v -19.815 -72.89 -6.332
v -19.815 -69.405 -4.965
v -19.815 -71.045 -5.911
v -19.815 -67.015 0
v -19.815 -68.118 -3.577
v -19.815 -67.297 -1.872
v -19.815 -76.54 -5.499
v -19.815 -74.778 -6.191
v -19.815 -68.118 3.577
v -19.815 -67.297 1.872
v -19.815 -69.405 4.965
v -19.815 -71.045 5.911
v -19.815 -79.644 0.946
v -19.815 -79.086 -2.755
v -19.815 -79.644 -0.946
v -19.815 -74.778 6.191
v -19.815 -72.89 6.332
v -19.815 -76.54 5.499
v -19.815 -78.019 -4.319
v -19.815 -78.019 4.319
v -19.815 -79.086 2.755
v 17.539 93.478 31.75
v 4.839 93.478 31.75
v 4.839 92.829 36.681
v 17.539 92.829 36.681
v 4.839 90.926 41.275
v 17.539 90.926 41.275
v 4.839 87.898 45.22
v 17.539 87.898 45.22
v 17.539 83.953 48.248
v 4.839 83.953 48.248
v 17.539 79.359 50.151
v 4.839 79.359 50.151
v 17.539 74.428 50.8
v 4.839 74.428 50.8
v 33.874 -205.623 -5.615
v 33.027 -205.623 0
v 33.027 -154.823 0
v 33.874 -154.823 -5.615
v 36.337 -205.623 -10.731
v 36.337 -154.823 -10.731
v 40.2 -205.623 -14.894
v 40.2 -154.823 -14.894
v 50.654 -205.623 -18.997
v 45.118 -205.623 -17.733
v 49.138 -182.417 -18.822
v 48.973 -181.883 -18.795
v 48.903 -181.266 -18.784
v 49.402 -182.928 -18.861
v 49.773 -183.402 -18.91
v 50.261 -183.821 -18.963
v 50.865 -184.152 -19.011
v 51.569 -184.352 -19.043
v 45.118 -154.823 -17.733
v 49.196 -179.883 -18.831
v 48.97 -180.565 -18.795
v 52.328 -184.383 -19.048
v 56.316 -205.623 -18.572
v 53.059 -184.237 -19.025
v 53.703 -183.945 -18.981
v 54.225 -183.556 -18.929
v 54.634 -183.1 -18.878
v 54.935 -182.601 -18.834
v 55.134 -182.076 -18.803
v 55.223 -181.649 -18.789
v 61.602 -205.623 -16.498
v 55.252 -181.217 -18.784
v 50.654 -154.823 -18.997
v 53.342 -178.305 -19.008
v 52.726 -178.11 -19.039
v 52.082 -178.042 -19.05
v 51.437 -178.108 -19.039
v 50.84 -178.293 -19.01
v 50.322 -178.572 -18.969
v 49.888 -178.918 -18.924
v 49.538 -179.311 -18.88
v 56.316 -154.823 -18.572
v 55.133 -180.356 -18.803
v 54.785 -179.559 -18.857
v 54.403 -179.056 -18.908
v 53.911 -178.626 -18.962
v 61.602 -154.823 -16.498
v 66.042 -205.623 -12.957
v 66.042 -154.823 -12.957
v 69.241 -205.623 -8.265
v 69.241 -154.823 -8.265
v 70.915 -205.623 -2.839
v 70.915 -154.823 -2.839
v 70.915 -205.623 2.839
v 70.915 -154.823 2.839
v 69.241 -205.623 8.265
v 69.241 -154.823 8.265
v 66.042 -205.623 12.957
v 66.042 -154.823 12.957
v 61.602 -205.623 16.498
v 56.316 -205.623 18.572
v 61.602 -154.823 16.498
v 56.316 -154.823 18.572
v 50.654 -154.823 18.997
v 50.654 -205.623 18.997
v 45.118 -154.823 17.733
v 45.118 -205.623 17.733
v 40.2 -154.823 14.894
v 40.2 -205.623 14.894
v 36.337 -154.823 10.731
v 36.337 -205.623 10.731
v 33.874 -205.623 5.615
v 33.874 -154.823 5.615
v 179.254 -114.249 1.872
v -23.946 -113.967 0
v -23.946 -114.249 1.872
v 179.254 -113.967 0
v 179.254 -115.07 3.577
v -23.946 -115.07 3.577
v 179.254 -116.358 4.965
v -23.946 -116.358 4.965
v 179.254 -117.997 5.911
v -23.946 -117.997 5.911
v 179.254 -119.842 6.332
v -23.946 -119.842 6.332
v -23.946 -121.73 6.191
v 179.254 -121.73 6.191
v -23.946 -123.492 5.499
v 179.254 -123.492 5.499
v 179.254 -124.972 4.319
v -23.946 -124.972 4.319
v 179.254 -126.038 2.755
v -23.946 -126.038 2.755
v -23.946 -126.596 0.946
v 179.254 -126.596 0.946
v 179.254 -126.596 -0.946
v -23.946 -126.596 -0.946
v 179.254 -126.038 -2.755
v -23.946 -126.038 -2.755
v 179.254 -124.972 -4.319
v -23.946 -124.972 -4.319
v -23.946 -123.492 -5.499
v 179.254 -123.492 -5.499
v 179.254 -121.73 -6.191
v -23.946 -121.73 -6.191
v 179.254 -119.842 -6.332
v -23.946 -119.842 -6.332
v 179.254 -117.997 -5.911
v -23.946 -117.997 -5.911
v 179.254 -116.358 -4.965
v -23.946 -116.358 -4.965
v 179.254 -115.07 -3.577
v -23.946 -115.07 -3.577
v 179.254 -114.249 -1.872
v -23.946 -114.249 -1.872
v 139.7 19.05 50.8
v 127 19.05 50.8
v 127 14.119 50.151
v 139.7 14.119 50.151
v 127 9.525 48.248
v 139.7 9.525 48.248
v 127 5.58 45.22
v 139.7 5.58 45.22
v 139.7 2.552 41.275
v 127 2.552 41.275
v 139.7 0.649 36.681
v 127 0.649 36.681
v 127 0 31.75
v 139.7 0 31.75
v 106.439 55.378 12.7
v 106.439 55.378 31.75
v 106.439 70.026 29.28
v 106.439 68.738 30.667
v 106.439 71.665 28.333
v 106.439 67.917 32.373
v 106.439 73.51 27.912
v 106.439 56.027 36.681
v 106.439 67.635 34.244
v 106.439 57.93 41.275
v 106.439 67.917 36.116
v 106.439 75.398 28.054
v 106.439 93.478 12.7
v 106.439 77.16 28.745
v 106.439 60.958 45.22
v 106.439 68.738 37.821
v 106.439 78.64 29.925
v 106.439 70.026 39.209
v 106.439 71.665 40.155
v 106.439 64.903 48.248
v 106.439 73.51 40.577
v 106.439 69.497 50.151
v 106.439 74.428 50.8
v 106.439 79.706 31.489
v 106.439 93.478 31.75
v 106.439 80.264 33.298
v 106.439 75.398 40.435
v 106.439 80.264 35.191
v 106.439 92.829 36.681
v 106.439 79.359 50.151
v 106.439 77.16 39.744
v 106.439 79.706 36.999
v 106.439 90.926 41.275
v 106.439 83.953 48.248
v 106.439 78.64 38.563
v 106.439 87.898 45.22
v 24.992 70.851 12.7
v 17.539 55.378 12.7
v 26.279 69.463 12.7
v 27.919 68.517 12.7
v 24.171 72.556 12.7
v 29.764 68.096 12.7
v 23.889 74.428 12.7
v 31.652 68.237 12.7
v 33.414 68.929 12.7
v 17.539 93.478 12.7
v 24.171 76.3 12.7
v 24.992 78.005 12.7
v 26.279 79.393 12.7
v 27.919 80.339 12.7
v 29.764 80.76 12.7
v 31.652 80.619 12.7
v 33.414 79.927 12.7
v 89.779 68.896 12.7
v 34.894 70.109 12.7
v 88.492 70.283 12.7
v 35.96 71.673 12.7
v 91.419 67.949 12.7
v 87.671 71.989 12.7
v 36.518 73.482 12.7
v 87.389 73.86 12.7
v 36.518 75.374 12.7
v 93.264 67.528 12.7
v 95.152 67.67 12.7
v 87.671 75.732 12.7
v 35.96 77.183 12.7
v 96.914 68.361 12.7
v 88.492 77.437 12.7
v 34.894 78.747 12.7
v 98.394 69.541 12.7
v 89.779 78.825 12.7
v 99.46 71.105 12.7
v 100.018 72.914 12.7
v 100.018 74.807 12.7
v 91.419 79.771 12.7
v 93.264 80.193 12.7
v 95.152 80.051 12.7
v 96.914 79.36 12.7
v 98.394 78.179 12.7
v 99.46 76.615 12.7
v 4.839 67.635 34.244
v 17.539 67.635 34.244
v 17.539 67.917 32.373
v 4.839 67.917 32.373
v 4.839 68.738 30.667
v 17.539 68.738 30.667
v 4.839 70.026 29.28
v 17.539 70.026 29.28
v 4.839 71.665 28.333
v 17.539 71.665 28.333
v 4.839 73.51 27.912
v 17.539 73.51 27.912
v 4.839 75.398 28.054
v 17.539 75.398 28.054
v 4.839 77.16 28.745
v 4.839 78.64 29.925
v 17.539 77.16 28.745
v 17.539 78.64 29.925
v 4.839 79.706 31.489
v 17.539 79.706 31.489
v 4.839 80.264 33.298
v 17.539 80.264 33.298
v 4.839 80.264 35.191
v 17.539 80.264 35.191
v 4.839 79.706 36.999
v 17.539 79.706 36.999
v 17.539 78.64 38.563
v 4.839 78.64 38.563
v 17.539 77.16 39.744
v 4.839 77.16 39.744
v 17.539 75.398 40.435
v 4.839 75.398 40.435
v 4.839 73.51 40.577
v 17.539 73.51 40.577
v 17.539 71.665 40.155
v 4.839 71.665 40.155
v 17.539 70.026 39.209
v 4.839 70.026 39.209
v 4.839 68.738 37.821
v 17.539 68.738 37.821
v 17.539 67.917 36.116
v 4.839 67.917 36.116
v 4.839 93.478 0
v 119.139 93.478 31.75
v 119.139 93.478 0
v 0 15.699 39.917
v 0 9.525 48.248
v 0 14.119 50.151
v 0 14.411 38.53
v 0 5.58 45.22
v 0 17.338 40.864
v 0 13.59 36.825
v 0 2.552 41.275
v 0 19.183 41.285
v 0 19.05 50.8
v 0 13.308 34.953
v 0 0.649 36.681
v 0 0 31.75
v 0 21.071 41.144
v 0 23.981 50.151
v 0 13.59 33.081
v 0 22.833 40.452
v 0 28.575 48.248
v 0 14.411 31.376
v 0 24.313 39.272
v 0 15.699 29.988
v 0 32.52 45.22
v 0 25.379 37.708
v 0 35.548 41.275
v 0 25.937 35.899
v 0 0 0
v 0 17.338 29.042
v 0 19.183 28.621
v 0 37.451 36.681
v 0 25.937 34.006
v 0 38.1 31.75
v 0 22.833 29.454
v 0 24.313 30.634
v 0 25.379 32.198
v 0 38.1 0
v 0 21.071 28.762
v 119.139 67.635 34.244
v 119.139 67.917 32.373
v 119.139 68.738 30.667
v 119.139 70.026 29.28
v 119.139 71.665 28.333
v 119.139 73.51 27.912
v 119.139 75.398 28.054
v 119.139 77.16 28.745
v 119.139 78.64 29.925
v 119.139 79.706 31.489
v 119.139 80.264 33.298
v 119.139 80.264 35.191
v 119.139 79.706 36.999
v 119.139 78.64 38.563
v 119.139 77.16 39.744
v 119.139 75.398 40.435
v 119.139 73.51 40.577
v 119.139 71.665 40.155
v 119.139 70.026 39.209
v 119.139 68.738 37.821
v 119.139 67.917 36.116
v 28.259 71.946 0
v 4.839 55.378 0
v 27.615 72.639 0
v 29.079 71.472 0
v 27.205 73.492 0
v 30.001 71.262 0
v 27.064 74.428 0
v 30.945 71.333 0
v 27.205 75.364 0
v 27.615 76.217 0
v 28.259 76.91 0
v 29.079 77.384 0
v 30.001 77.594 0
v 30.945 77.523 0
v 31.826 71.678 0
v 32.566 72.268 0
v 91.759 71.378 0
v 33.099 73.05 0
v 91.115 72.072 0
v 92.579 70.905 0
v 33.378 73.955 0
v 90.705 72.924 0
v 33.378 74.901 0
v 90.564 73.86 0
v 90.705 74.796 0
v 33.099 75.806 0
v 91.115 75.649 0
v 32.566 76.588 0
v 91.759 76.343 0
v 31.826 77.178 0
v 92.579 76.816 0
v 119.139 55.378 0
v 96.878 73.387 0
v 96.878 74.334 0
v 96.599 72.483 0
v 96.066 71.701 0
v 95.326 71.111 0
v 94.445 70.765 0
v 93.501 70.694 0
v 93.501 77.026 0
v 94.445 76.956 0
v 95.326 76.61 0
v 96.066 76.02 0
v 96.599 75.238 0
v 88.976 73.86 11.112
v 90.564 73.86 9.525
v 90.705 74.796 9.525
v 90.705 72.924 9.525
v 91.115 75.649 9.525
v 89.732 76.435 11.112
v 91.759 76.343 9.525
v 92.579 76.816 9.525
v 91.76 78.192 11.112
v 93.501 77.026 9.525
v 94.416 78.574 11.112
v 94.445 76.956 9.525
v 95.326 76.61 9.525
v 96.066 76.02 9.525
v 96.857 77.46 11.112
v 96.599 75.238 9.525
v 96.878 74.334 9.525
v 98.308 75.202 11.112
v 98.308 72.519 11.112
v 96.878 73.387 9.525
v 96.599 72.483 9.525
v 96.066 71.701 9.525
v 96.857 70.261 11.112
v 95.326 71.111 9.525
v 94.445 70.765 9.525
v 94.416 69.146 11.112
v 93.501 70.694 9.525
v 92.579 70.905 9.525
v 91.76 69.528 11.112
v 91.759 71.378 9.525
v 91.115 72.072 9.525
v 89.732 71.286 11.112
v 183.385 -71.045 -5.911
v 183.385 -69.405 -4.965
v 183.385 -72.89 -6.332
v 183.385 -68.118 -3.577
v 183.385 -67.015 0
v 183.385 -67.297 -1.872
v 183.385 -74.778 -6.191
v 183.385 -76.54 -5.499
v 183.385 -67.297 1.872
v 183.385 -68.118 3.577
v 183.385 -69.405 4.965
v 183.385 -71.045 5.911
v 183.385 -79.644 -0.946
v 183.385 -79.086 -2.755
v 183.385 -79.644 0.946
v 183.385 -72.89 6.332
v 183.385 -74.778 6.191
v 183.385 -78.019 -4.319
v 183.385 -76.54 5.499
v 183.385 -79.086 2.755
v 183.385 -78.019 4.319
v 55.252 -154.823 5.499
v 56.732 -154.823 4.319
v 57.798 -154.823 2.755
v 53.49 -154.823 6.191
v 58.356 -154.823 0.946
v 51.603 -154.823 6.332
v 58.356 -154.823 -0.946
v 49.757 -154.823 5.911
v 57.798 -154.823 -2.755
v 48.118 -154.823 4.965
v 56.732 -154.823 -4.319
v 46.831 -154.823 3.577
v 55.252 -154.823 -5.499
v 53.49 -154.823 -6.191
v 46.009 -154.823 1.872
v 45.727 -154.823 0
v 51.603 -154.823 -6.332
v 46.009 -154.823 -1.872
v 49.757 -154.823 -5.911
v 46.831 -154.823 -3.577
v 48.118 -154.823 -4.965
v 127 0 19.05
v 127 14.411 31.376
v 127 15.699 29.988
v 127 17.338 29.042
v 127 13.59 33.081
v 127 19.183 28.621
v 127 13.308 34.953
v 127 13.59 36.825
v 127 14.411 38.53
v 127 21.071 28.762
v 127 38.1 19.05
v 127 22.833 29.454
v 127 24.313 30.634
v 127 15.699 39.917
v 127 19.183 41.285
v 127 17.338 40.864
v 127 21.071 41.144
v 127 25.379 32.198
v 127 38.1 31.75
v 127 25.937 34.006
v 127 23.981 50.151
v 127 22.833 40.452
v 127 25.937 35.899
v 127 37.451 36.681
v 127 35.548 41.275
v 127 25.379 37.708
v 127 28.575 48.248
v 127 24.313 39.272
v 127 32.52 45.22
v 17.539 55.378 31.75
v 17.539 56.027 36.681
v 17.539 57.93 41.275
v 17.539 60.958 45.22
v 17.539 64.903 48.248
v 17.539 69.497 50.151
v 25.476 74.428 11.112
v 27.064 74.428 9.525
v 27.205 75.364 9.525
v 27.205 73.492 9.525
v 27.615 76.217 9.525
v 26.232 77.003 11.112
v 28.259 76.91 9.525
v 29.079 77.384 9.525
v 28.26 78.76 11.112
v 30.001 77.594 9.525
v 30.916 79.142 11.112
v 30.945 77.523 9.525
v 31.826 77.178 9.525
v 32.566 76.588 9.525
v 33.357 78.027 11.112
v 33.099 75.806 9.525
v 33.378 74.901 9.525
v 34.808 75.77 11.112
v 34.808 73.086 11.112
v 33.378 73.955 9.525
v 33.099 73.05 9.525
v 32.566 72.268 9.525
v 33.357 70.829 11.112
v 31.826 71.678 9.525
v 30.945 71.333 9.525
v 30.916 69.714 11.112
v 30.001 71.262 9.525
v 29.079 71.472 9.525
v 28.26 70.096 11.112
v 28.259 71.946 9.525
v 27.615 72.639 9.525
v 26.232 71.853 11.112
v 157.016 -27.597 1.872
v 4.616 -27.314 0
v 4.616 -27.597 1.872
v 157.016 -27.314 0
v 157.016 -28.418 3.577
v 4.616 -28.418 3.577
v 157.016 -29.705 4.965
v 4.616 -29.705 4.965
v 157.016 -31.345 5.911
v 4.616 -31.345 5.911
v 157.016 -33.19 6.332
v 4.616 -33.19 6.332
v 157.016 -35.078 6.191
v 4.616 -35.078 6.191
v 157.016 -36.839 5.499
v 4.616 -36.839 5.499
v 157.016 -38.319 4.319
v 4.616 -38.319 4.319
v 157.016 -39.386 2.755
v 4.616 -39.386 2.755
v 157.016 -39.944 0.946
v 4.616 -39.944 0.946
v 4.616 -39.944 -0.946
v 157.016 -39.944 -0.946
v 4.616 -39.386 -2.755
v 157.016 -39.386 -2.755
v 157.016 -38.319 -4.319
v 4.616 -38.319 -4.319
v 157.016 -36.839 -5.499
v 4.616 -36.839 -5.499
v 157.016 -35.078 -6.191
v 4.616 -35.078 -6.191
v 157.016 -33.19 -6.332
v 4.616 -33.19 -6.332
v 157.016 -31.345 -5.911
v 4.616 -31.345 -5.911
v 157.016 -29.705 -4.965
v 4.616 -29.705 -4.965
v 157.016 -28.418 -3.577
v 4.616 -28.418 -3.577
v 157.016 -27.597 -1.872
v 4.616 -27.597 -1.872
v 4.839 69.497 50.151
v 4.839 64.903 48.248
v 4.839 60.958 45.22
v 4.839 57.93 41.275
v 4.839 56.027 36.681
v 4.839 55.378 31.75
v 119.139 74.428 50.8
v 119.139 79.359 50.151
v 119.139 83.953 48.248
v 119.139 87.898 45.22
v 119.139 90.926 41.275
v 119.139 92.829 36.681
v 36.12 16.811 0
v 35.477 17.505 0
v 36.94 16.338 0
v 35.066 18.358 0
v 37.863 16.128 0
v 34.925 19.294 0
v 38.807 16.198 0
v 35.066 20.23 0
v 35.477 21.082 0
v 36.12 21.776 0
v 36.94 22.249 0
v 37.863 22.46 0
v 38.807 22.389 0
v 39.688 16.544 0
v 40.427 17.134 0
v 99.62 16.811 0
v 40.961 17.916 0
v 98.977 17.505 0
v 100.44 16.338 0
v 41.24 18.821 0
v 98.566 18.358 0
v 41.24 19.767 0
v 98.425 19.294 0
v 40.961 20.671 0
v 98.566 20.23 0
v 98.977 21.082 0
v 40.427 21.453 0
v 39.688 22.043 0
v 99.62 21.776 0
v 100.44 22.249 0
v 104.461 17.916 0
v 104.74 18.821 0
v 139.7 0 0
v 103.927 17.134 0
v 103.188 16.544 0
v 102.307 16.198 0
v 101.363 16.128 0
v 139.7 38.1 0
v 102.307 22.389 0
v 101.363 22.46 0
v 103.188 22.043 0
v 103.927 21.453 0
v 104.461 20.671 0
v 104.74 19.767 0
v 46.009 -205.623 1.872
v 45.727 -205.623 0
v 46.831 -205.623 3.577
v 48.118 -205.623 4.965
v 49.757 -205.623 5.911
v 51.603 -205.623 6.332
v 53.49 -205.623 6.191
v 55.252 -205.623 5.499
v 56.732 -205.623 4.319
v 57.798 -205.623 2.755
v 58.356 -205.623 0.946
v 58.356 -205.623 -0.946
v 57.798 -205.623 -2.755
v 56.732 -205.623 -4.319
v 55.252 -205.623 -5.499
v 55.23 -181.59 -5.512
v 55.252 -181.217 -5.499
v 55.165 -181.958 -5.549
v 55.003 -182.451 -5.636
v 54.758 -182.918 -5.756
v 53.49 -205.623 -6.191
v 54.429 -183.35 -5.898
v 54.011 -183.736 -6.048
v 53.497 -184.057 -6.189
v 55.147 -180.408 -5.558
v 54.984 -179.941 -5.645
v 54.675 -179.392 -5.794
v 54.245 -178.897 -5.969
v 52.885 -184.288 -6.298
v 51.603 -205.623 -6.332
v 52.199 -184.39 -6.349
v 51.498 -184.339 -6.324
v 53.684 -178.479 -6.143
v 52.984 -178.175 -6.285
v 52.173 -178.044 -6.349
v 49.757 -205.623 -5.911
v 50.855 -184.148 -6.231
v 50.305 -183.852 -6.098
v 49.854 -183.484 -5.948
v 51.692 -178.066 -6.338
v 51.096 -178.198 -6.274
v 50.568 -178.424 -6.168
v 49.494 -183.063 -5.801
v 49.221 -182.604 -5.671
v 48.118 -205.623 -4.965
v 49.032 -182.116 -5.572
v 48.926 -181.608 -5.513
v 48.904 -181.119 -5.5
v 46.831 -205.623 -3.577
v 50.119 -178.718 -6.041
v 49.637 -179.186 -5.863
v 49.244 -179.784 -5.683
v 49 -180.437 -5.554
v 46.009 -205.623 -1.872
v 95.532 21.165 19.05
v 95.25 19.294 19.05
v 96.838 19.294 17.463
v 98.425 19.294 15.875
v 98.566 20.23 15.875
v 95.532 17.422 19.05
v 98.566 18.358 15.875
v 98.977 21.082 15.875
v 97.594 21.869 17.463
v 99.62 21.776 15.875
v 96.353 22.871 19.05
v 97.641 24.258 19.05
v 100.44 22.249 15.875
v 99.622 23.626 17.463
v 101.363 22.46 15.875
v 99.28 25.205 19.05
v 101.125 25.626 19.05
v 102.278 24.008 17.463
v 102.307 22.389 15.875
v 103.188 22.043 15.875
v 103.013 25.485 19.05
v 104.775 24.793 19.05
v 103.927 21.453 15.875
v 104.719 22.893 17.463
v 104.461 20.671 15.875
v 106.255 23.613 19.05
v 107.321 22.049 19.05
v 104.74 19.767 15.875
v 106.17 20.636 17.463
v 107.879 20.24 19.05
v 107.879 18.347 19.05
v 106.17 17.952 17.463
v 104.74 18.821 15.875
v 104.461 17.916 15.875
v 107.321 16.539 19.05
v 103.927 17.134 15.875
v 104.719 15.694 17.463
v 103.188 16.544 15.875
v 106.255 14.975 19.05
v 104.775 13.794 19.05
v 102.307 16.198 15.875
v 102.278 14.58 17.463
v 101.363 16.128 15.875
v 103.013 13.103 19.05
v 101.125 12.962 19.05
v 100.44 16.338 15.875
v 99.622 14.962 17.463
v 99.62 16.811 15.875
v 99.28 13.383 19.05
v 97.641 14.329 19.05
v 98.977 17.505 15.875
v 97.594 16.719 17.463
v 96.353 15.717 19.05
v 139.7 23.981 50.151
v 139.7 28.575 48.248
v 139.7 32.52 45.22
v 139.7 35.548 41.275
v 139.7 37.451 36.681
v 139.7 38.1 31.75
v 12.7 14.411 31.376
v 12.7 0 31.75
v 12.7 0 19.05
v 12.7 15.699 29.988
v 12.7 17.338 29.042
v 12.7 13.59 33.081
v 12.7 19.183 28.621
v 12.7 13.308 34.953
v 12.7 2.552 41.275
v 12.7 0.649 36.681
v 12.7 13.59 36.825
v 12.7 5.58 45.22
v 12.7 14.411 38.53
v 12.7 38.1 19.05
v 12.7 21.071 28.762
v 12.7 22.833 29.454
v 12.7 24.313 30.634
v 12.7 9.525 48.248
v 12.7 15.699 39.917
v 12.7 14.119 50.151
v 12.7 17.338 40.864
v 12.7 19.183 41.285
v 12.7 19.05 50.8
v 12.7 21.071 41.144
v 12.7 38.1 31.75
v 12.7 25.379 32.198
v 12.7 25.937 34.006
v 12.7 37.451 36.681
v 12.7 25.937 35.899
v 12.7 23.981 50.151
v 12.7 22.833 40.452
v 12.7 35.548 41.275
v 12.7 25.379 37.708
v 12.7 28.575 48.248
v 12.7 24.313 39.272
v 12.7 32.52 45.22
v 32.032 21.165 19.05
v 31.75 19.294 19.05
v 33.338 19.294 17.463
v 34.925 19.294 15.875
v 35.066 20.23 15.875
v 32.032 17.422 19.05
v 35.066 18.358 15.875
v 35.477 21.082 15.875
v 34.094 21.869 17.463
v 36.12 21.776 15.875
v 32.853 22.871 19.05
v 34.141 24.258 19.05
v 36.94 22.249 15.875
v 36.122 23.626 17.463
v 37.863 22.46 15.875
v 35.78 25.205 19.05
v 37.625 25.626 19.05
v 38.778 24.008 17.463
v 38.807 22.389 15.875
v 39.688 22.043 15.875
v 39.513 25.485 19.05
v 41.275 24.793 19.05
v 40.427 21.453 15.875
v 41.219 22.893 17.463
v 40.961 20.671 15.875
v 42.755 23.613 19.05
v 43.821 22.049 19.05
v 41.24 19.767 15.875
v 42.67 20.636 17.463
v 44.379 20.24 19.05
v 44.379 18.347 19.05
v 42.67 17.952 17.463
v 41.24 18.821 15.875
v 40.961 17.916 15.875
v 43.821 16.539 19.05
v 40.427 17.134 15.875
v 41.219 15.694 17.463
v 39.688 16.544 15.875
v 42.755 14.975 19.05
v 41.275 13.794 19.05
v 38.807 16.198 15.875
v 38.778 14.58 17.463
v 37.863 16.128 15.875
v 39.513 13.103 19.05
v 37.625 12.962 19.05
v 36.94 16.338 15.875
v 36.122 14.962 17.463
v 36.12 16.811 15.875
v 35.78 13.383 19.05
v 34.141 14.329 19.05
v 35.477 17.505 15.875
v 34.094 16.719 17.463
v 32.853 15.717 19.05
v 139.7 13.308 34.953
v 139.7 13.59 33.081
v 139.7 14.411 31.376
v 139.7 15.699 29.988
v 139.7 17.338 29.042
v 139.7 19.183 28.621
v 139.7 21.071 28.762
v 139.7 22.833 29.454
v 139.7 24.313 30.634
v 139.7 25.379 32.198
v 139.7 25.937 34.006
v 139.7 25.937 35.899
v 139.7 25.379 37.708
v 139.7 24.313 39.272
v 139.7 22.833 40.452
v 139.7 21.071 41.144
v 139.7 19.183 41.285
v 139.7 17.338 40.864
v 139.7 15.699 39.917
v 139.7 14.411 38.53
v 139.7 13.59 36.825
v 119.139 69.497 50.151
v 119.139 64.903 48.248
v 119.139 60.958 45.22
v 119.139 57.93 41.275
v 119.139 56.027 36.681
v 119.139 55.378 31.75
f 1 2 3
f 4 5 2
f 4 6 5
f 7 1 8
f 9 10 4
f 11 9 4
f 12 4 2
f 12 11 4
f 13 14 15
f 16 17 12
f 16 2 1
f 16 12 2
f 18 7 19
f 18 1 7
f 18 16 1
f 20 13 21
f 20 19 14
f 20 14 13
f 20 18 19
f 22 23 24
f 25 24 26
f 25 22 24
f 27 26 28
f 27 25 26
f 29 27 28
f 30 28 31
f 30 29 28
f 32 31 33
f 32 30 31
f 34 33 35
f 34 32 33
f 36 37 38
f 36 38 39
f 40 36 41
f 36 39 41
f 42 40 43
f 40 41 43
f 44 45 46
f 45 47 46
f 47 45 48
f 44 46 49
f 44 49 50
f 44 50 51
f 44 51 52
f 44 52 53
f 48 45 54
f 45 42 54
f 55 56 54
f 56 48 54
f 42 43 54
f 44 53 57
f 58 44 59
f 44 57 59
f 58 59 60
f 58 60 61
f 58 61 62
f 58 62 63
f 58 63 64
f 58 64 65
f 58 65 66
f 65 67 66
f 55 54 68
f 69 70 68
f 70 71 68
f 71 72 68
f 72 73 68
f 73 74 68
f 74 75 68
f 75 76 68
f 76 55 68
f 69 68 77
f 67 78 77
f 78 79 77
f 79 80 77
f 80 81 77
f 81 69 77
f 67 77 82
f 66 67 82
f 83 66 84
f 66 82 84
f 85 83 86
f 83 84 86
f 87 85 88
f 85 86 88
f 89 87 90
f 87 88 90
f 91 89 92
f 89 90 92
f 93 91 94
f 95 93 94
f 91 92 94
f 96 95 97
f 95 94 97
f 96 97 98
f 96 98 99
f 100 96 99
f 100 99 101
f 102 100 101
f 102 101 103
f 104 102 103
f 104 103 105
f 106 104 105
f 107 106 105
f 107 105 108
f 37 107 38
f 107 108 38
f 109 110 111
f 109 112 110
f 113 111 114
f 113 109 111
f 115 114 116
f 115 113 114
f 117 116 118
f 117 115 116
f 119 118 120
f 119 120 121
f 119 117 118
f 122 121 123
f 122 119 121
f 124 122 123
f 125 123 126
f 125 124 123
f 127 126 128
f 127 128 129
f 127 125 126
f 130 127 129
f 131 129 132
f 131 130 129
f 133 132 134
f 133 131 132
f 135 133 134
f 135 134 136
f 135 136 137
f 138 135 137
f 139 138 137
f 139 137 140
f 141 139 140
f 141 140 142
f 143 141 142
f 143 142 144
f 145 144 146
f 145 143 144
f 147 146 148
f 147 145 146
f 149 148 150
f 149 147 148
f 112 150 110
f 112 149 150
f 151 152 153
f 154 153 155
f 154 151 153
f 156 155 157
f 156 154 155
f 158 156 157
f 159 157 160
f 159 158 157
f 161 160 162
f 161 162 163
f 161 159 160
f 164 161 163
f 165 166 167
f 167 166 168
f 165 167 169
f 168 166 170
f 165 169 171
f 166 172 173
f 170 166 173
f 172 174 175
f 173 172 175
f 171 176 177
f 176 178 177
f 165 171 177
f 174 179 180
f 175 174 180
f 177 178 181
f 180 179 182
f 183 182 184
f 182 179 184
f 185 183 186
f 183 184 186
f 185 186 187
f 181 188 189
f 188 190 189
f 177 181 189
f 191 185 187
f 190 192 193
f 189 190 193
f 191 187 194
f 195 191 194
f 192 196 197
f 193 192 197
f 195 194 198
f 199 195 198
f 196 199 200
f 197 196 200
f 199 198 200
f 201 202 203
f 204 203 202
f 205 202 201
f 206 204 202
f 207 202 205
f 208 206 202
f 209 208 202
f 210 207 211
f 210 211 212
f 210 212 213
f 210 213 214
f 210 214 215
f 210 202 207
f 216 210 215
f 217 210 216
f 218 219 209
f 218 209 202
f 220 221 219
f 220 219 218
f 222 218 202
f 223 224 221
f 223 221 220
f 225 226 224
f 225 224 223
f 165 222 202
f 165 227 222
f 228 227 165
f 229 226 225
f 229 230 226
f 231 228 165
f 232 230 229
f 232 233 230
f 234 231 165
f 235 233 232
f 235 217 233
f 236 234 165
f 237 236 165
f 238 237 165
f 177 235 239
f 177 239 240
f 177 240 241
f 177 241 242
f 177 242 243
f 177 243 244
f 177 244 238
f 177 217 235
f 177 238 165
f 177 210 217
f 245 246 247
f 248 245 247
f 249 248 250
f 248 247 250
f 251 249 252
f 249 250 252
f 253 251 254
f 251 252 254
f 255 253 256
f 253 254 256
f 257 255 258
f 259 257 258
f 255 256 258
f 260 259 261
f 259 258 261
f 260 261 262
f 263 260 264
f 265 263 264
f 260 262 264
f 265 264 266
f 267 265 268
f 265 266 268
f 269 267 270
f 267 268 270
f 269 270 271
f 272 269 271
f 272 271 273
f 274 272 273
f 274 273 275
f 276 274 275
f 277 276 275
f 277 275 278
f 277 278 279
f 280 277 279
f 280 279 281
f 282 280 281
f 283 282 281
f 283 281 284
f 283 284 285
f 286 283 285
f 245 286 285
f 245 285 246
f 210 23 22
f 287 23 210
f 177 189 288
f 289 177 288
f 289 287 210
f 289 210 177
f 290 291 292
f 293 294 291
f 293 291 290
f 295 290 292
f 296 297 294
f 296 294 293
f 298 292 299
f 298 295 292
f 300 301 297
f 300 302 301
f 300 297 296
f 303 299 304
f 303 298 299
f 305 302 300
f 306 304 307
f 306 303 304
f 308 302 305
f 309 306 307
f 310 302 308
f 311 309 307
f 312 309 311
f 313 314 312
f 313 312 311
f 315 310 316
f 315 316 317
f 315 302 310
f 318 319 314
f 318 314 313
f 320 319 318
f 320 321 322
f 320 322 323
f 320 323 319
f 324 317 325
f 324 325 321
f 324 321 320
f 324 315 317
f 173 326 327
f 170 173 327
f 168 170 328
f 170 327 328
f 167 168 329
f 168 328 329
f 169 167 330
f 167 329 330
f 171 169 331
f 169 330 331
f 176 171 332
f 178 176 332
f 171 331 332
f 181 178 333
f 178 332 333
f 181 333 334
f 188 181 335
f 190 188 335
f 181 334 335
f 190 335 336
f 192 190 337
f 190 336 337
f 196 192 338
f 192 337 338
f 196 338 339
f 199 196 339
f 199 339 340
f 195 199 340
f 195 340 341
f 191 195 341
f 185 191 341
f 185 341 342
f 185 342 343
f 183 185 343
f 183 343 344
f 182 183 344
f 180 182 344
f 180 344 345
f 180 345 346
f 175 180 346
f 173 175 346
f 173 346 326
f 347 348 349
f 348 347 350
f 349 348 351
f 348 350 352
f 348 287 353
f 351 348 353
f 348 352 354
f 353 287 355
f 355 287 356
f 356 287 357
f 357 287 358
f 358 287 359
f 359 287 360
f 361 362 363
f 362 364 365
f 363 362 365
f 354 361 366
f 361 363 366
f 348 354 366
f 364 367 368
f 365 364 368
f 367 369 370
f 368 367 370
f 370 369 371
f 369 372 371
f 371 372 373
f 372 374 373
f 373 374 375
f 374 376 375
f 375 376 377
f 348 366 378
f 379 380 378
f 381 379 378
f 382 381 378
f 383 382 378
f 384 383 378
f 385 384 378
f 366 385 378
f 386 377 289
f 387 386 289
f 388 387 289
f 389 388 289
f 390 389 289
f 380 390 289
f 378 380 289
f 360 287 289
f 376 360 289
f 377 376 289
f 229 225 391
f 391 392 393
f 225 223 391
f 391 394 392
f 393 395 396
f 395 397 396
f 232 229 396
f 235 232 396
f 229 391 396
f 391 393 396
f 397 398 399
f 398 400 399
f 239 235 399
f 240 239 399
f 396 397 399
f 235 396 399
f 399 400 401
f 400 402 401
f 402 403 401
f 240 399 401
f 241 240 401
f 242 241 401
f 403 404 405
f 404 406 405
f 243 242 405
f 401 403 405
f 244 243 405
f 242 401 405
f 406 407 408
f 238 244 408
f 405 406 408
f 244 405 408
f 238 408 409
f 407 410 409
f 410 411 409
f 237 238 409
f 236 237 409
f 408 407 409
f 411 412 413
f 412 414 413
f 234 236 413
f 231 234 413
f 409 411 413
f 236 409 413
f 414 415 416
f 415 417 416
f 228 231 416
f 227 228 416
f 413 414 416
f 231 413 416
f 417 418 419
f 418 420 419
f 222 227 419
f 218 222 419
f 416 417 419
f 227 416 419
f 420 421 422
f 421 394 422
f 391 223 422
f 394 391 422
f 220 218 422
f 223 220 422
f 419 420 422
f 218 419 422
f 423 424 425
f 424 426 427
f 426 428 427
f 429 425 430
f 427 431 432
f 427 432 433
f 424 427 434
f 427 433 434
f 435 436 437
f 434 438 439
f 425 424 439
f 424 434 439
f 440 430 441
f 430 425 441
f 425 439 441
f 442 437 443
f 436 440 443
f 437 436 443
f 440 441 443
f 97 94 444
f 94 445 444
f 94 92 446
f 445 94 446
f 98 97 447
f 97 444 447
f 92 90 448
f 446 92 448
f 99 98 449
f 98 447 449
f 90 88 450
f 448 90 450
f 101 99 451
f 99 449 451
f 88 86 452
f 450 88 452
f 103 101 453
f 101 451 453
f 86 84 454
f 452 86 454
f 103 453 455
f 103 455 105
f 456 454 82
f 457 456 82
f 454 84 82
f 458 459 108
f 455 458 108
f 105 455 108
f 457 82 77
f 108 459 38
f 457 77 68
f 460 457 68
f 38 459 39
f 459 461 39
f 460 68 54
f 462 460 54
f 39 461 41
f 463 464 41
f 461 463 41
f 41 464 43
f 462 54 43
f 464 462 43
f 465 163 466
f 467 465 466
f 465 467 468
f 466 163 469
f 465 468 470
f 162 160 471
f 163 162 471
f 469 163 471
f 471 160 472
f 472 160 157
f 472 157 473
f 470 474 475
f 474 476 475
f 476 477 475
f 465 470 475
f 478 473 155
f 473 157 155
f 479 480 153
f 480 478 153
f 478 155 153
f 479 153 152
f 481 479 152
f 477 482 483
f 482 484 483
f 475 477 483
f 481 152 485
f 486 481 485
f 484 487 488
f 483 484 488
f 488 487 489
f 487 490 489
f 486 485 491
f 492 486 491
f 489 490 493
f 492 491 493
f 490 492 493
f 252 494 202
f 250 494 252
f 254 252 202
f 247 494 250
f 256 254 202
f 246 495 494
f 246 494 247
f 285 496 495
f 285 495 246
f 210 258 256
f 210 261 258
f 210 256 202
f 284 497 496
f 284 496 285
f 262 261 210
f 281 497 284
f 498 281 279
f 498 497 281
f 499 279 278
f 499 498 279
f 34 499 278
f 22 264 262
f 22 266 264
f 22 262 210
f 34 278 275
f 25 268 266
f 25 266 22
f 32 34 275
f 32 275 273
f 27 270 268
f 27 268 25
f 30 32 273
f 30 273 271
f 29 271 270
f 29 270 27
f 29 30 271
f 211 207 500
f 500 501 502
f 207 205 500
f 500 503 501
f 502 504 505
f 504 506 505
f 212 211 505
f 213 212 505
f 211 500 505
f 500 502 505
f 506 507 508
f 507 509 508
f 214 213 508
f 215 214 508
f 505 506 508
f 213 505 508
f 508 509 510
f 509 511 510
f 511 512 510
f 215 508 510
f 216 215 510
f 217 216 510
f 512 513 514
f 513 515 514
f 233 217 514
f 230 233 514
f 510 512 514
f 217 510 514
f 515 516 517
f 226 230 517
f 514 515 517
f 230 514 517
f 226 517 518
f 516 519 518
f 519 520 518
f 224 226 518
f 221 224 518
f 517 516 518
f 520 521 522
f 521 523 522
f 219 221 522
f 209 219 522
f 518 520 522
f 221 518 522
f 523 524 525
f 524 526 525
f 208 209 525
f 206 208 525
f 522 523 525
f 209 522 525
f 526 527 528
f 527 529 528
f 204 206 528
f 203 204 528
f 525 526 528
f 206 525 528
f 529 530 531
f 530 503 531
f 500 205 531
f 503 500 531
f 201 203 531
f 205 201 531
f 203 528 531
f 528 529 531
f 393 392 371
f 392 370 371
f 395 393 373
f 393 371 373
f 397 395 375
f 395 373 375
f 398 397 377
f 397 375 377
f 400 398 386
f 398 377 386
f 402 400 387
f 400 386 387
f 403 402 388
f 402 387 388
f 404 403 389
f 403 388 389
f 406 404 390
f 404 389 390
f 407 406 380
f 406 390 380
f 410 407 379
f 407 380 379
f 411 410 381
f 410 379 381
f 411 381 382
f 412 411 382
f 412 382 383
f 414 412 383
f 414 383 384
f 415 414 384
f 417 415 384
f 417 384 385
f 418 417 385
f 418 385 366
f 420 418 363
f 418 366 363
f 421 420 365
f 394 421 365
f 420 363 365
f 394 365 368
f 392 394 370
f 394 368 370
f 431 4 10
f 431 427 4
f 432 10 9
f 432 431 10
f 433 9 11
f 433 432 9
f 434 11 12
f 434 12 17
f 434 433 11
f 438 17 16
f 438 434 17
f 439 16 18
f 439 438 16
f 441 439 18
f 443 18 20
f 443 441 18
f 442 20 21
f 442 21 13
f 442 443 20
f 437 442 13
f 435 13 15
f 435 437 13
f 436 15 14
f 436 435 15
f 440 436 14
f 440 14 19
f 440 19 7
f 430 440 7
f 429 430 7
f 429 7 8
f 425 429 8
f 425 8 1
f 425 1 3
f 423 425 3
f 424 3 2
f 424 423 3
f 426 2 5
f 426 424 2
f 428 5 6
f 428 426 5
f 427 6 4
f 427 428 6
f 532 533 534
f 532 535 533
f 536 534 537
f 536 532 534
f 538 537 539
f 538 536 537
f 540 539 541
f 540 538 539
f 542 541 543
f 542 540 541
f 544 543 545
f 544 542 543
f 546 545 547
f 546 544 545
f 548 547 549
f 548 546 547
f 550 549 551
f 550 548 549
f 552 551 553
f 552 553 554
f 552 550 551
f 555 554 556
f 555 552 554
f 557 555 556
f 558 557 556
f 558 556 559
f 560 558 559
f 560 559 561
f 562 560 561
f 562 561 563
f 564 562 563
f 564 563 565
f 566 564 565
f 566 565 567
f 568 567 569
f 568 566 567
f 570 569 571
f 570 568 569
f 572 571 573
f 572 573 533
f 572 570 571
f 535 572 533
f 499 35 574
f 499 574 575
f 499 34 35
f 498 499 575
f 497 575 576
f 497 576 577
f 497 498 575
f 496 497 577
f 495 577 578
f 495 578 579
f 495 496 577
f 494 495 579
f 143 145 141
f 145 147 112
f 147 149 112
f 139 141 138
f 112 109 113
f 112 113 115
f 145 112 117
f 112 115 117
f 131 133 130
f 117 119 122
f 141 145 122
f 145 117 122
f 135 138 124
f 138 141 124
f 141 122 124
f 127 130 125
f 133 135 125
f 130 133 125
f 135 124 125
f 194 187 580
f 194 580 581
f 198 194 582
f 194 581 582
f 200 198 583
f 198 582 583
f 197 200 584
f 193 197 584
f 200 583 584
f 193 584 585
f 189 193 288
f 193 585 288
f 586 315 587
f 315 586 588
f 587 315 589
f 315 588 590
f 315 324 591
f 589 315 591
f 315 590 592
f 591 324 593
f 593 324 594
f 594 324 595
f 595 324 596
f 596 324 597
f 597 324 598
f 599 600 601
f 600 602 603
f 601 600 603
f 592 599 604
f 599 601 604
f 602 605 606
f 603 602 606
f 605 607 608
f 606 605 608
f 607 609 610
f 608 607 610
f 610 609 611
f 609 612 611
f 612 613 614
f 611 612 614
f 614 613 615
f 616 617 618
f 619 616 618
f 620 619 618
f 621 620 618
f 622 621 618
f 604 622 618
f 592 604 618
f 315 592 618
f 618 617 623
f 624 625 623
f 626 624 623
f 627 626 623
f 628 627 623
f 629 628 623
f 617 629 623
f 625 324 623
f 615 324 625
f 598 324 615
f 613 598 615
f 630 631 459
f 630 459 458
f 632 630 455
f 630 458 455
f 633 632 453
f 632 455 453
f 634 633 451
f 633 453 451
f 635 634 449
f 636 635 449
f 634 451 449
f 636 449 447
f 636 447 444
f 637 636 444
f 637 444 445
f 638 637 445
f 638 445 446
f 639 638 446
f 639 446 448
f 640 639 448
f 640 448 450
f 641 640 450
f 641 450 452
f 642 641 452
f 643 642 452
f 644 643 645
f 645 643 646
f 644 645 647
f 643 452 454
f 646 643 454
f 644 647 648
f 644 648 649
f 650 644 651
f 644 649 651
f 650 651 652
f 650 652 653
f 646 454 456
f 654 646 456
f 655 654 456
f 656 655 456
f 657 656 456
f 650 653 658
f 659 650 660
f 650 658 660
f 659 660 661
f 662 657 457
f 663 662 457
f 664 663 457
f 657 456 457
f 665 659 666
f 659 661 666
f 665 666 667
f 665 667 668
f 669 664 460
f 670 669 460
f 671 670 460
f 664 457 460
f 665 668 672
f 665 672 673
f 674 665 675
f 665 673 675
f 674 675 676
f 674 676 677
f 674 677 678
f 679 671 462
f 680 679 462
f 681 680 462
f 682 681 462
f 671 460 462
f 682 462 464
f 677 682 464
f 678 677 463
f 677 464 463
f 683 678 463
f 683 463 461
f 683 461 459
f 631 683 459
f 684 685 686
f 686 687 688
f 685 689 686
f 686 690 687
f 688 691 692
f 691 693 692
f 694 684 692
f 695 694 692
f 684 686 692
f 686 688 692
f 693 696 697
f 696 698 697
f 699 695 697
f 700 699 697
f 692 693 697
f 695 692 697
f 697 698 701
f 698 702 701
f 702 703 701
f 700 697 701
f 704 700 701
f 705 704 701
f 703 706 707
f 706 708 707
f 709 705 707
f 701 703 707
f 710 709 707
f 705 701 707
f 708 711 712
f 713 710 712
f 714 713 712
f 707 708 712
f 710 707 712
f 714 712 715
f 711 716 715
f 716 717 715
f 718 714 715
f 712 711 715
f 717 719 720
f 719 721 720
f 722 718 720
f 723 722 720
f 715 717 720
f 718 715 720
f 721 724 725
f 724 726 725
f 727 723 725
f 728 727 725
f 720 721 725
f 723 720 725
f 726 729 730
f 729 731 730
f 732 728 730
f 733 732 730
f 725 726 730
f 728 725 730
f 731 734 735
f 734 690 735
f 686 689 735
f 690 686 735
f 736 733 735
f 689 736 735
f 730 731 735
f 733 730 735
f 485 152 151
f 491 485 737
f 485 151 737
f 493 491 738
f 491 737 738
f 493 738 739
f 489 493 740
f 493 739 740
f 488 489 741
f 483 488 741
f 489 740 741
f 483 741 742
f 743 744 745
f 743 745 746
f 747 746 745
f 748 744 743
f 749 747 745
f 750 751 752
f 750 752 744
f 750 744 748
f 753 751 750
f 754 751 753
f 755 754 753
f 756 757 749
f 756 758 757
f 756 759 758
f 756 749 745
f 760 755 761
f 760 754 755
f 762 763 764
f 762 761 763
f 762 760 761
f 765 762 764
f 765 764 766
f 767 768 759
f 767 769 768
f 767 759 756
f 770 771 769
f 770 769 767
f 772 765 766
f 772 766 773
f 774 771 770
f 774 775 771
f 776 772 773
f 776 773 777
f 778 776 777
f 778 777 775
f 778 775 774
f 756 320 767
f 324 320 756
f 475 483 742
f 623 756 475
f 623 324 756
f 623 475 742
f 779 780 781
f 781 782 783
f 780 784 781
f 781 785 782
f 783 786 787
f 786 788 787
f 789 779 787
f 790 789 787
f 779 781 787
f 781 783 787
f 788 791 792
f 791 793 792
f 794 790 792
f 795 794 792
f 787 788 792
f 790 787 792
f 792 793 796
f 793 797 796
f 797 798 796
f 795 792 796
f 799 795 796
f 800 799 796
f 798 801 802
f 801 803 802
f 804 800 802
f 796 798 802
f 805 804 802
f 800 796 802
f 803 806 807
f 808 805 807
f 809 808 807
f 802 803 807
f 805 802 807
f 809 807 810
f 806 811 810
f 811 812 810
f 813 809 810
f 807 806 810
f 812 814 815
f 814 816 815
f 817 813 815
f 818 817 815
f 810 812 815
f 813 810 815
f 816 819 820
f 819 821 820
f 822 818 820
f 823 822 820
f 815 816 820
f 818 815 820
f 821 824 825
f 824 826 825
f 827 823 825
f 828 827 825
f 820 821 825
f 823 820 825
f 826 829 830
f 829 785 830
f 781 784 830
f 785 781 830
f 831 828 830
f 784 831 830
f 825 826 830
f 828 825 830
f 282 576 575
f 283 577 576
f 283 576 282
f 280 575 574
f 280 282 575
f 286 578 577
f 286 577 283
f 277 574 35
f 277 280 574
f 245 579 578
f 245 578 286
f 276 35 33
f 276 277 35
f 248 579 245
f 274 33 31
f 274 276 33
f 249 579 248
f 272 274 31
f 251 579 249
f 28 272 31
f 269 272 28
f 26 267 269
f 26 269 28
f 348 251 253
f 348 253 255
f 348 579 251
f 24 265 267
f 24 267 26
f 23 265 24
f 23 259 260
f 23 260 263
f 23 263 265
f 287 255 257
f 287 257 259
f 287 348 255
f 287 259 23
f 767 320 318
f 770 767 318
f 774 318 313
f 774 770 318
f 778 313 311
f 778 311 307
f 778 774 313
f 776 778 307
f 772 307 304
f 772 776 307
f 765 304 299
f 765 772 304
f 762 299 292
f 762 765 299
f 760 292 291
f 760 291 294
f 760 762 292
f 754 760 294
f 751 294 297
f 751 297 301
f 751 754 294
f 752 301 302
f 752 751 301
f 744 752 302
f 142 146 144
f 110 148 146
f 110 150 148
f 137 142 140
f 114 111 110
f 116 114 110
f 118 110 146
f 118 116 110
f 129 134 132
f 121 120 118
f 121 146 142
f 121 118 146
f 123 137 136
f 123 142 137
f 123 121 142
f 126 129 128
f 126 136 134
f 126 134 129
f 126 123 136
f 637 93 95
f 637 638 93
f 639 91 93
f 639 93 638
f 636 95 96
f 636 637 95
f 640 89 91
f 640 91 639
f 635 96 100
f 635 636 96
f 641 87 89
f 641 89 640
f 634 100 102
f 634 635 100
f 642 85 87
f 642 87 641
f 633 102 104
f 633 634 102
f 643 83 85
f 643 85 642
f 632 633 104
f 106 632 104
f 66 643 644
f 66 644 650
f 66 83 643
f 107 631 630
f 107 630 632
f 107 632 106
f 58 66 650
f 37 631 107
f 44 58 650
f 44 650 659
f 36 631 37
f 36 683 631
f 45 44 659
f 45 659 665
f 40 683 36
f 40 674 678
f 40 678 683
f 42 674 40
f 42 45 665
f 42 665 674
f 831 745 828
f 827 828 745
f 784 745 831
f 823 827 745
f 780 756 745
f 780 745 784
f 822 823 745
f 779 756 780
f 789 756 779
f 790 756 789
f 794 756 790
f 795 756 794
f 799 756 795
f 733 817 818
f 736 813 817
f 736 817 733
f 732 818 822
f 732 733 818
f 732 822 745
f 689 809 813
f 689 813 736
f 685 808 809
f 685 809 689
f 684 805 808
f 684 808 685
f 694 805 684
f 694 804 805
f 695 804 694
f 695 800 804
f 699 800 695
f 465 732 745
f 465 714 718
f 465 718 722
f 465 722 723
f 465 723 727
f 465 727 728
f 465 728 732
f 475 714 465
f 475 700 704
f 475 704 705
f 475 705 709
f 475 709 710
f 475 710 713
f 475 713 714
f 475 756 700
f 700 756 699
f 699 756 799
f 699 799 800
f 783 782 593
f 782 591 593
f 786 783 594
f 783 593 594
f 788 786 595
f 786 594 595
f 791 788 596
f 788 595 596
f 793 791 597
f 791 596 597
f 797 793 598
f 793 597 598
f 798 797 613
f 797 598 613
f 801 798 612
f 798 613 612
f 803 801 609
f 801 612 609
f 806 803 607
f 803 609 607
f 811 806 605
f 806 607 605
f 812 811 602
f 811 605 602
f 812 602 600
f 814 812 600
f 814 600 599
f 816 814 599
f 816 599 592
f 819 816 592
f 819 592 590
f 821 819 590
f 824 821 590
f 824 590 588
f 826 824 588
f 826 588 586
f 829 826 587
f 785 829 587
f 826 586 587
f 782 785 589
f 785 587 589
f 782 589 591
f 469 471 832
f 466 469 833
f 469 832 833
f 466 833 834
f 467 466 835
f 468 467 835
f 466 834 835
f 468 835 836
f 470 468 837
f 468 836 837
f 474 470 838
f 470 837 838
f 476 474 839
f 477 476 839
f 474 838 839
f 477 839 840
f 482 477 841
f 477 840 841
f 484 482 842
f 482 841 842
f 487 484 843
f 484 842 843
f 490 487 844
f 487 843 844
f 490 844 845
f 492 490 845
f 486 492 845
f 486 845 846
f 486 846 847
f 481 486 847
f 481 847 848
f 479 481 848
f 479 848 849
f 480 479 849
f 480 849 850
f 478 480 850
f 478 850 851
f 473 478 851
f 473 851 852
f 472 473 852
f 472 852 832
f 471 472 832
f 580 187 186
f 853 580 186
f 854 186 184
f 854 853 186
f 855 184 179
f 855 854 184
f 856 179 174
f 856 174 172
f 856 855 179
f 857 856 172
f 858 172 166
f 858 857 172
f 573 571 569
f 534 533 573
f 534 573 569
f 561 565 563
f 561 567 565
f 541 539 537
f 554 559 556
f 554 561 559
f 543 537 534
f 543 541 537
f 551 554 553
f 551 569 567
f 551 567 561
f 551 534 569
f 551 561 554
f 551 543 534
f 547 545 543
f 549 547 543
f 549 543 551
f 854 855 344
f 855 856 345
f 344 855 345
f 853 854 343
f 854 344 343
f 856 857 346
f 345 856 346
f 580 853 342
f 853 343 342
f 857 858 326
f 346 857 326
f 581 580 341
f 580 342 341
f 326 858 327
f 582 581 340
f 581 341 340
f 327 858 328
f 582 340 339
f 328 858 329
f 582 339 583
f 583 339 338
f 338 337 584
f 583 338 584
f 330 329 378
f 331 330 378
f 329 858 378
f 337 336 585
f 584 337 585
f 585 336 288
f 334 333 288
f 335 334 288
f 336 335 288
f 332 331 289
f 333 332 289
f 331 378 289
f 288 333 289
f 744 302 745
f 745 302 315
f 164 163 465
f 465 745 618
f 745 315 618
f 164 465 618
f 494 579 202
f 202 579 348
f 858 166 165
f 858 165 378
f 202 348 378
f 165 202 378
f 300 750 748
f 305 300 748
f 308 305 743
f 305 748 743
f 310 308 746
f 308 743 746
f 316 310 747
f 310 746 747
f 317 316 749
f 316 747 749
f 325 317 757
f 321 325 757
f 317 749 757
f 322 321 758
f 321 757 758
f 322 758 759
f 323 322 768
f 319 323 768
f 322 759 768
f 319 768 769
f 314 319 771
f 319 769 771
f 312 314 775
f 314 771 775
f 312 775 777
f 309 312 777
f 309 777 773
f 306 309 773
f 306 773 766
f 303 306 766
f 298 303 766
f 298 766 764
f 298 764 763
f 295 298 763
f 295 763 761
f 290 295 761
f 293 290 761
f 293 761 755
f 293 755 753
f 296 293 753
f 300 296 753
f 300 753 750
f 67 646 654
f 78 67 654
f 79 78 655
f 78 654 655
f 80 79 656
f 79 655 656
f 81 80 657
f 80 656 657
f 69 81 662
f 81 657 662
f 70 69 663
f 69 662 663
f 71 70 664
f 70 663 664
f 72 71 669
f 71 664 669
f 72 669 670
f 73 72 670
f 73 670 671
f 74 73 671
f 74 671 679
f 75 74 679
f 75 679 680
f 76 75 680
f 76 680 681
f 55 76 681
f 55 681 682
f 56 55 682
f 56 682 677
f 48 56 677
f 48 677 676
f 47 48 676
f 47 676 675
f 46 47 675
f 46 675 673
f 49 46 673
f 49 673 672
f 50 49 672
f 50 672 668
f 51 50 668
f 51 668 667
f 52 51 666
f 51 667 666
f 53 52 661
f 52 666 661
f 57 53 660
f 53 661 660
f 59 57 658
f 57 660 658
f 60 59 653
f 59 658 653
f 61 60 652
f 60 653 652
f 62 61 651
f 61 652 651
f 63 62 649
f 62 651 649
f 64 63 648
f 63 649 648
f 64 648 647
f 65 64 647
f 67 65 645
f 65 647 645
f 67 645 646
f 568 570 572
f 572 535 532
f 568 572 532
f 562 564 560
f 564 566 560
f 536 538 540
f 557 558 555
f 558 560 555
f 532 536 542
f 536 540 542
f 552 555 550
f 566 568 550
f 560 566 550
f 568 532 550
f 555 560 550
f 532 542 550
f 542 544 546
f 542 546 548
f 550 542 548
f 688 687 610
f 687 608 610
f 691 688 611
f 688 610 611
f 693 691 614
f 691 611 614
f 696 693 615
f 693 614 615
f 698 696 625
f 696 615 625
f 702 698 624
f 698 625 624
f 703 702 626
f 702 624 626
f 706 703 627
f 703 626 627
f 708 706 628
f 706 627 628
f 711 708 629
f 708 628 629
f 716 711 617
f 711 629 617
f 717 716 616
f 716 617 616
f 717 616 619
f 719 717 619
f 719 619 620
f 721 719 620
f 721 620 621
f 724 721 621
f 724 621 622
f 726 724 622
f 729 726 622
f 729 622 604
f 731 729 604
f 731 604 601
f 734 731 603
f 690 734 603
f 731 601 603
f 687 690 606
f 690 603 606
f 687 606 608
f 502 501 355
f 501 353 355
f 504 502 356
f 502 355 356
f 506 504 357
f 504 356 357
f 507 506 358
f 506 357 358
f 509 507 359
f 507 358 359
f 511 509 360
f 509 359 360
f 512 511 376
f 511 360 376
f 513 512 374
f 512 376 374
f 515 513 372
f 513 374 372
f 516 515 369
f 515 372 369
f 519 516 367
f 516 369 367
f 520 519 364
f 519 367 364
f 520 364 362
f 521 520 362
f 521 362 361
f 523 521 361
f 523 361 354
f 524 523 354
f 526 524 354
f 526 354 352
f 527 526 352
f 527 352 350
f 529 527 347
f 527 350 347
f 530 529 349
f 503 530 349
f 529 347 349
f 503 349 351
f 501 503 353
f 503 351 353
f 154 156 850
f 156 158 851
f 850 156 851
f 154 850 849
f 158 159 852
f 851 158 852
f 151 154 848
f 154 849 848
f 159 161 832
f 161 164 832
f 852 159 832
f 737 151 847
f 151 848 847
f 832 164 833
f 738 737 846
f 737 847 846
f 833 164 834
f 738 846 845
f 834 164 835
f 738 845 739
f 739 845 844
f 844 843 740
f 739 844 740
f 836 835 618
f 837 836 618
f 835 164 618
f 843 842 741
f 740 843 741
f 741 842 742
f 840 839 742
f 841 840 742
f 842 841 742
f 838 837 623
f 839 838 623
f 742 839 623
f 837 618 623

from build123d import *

# Parameters (mm, degrees)
F0_W            = 139.7
F0_H            = 38.1
F1_DEPTH        = 50.8
F2_W            = 114.3
F2_H            = 38.1
F3_DEPTH        = 31.75
F5_D            = 12.7
F7_D            = 6.35
F7_CSINK_D      = 12.7
F7_CSINK_ANGLE  = 90
F8_D            = 6.35
F8_CSINK_D      = 12.7
F8_CSINK_ANGLE  = 90
F9_W            = 114.3
F9_H            = 38.1
F10_DEPTH       = 50.8
F11_W           = 88.9
F11_H           = 38.1
F12_DEPTH       = 38.1
F14_D           = 12.7
F16_D           = 6.35
F16_CSINK_D     = 12.7
F16_CSINK_ANGLE = 90
F17_W           = 152.4
F17_H           = 6.35
F19_R           = 19.04999
F19_2_R         = 19.04999
F20_W           = 203.2
F20_H           = 6.35
F22_W           = 203.2
F22_H           = 6.35
F24_W           = 19.05
F24_H           = 50.8
F27_D           = 6.35
F27_DEPTH       = 19.051
F28_D           = 12.7


# Not quite as in the source:
# - a fillet or chamfer is up to 0.001 mm smaller than in the source, because OpenCascade refuses the exact size


with BuildPart() as f1:
    # F0 (on Top) → F1 (new body)
    with BuildSketch(Plane.XY):
        with Locations((69.85, 19.05)):
            Rectangle(F0_W, F0_H)
    extrude(amount=F1_DEPTH)

    # F2 (on face) → F3 (cut)
    with BuildSketch(Plane.XY.offset(50.8)):
        with Locations((69.85, 19.05)):
            Rectangle(F2_W, F2_H)
    extrude(amount=-F3_DEPTH, mode=Mode.SUBTRACT)

    # F5 (through all)
    with Locations(Plane(origin=(0, 0, 0), x_dir=(0, 1, 0), z_dir=(-1, 0, 0))):
        with Locations((19.6577664465, -34.9528230727)):
            Hole(F5_D / 2)

    # F7 (through all)
    with Locations(Plane.XY.offset(19.05)):
        with Locations((38.1, 19.2937536606)):
            CounterSinkHole(F7_D / 2, F7_CSINK_D / 2, counter_sink_angle=F7_CSINK_ANGLE)

    # F8 (through all)
    with Locations(Plane.XY.offset(19.05)):
        with Locations((101.6, 19.2937536606)):
            CounterSinkHole(F8_D / 2, F8_CSINK_D / 2, counter_sink_angle=F8_CSINK_ANGLE)

    # F19#2 (radius 19.05 in the source; OpenCascade refuses exactly that, so slightly less here)
    f19_2_edges = [f1.edges().sort_by_distance(p)[0] for p in [
        (6.35, 38.1, 50.8),
        (6.35, 0, 50.8),
        (133.35, 38.1, 50.8),
        (133.35, 0, 50.8),
    ]]
    fillet(f19_2_edges, radius=F19_2_R)


with BuildPart() as f10:
    # F9 (on Top) → F10 (new body)
    with BuildSketch(Plane.XY):
        with Locations((61.9886387933, 74.4279935342)):
            Rectangle(F9_W, F9_H)
    extrude(amount=F10_DEPTH)

    # F11 (on face) → F12 (cut)
    with BuildSketch(Plane.XY.offset(50.8)):
        with Locations((61.9886387933, 74.4279935342)):
            Rectangle(F11_W, F11_H)
    extrude(amount=-F12_DEPTH, mode=Mode.SUBTRACT)

    # F14 (through all)
    with Locations(Plane(origin=(0, 0, 0), x_dir=(0, 1, 0), z_dir=(-1, 0, 0))):
        with Locations((73.9847123623, -34.2443138361)):
            Hole(F14_D / 2)

    # F16 (through all)
    with Locations(Plane.XY.offset(12.7)):
        with Locations((30.2386387933, 74.4279935342), (93.7386387933, 73.8603323698)):
            CounterSinkHole(F16_D / 2, F16_CSINK_D / 2, counter_sink_angle=F16_CSINK_ANGLE)

    # F19 (radius 19.05 in the source; OpenCascade refuses exactly that, so slightly less here)
    f19_edges = [f10.edges().sort_by_distance(p)[0] for p in [
        (11.188639, 93.477994, 50.8),
        (11.188639, 55.377994, 50.8),
        (112.788639, 55.377994, 50.8),
        (112.788639, 93.477994, 50.8),
    ]]
    fillet(f19_edges, radius=F19_R)


with BuildPart() as f18:
    # F17 (on Top) → F18 (revolve)
    with BuildSketch(Plane.XY):
        with Locations((80.8163173497, -30.4894949675)):
            Rectangle(F17_W, F17_H)
    revolve(axis=Axis((80.8163173497, -33.6644949675, 0), (1, 0, 0)))


with BuildPart() as f21:
    # F20 (on Top) → F21 (revolve)
    with BuildSketch(Plane.XY):
        with Locations((81.7854143679, -70.1896044196)):
            Rectangle(F20_W, F20_H)
    revolve(axis=Axis((81.7854143679, -73.3646044196, 0), (1, 0, 0)))


with BuildPart() as f23:
    # F22 (on Top) → F23 (revolve)
    with BuildSketch(Plane.XY):
        with Locations((77.6535756886, -117.141823427)):
            Rectangle(F22_W, F22_H)
    revolve(axis=Axis((77.6535756886, -120.316823427, 0), (1, 0, 0)))


with BuildPart() as f25:
    # F24 (on Top) → F25 (revolve)
    with BuildSketch(Plane.XY):
        with Locations((42.55234483, -180.2226006985)):
            Rectangle(F24_W, F24_H)
    revolve(axis=Axis((52.07734483, -180.2226006985, 0), (0, -1, 0)))

    # F27 (through all, one way)
    with BuildSketch(Plane.XY):
        with Locations((52.07734483, -181.2174618244)):
            Circle(F27_D / 2)
    extrude(amount=-F27_DEPTH, mode=Mode.SUBTRACT)

    # F28 (through all)
    with Locations(Plane.XZ.offset(205.6226006985)):
        with Locations((52.07734483, 0)):
            Hole(F28_D / 2)


solid = Compound([f1.part, f10.part, f18.part, f21.part, f23.part, f25.part])
